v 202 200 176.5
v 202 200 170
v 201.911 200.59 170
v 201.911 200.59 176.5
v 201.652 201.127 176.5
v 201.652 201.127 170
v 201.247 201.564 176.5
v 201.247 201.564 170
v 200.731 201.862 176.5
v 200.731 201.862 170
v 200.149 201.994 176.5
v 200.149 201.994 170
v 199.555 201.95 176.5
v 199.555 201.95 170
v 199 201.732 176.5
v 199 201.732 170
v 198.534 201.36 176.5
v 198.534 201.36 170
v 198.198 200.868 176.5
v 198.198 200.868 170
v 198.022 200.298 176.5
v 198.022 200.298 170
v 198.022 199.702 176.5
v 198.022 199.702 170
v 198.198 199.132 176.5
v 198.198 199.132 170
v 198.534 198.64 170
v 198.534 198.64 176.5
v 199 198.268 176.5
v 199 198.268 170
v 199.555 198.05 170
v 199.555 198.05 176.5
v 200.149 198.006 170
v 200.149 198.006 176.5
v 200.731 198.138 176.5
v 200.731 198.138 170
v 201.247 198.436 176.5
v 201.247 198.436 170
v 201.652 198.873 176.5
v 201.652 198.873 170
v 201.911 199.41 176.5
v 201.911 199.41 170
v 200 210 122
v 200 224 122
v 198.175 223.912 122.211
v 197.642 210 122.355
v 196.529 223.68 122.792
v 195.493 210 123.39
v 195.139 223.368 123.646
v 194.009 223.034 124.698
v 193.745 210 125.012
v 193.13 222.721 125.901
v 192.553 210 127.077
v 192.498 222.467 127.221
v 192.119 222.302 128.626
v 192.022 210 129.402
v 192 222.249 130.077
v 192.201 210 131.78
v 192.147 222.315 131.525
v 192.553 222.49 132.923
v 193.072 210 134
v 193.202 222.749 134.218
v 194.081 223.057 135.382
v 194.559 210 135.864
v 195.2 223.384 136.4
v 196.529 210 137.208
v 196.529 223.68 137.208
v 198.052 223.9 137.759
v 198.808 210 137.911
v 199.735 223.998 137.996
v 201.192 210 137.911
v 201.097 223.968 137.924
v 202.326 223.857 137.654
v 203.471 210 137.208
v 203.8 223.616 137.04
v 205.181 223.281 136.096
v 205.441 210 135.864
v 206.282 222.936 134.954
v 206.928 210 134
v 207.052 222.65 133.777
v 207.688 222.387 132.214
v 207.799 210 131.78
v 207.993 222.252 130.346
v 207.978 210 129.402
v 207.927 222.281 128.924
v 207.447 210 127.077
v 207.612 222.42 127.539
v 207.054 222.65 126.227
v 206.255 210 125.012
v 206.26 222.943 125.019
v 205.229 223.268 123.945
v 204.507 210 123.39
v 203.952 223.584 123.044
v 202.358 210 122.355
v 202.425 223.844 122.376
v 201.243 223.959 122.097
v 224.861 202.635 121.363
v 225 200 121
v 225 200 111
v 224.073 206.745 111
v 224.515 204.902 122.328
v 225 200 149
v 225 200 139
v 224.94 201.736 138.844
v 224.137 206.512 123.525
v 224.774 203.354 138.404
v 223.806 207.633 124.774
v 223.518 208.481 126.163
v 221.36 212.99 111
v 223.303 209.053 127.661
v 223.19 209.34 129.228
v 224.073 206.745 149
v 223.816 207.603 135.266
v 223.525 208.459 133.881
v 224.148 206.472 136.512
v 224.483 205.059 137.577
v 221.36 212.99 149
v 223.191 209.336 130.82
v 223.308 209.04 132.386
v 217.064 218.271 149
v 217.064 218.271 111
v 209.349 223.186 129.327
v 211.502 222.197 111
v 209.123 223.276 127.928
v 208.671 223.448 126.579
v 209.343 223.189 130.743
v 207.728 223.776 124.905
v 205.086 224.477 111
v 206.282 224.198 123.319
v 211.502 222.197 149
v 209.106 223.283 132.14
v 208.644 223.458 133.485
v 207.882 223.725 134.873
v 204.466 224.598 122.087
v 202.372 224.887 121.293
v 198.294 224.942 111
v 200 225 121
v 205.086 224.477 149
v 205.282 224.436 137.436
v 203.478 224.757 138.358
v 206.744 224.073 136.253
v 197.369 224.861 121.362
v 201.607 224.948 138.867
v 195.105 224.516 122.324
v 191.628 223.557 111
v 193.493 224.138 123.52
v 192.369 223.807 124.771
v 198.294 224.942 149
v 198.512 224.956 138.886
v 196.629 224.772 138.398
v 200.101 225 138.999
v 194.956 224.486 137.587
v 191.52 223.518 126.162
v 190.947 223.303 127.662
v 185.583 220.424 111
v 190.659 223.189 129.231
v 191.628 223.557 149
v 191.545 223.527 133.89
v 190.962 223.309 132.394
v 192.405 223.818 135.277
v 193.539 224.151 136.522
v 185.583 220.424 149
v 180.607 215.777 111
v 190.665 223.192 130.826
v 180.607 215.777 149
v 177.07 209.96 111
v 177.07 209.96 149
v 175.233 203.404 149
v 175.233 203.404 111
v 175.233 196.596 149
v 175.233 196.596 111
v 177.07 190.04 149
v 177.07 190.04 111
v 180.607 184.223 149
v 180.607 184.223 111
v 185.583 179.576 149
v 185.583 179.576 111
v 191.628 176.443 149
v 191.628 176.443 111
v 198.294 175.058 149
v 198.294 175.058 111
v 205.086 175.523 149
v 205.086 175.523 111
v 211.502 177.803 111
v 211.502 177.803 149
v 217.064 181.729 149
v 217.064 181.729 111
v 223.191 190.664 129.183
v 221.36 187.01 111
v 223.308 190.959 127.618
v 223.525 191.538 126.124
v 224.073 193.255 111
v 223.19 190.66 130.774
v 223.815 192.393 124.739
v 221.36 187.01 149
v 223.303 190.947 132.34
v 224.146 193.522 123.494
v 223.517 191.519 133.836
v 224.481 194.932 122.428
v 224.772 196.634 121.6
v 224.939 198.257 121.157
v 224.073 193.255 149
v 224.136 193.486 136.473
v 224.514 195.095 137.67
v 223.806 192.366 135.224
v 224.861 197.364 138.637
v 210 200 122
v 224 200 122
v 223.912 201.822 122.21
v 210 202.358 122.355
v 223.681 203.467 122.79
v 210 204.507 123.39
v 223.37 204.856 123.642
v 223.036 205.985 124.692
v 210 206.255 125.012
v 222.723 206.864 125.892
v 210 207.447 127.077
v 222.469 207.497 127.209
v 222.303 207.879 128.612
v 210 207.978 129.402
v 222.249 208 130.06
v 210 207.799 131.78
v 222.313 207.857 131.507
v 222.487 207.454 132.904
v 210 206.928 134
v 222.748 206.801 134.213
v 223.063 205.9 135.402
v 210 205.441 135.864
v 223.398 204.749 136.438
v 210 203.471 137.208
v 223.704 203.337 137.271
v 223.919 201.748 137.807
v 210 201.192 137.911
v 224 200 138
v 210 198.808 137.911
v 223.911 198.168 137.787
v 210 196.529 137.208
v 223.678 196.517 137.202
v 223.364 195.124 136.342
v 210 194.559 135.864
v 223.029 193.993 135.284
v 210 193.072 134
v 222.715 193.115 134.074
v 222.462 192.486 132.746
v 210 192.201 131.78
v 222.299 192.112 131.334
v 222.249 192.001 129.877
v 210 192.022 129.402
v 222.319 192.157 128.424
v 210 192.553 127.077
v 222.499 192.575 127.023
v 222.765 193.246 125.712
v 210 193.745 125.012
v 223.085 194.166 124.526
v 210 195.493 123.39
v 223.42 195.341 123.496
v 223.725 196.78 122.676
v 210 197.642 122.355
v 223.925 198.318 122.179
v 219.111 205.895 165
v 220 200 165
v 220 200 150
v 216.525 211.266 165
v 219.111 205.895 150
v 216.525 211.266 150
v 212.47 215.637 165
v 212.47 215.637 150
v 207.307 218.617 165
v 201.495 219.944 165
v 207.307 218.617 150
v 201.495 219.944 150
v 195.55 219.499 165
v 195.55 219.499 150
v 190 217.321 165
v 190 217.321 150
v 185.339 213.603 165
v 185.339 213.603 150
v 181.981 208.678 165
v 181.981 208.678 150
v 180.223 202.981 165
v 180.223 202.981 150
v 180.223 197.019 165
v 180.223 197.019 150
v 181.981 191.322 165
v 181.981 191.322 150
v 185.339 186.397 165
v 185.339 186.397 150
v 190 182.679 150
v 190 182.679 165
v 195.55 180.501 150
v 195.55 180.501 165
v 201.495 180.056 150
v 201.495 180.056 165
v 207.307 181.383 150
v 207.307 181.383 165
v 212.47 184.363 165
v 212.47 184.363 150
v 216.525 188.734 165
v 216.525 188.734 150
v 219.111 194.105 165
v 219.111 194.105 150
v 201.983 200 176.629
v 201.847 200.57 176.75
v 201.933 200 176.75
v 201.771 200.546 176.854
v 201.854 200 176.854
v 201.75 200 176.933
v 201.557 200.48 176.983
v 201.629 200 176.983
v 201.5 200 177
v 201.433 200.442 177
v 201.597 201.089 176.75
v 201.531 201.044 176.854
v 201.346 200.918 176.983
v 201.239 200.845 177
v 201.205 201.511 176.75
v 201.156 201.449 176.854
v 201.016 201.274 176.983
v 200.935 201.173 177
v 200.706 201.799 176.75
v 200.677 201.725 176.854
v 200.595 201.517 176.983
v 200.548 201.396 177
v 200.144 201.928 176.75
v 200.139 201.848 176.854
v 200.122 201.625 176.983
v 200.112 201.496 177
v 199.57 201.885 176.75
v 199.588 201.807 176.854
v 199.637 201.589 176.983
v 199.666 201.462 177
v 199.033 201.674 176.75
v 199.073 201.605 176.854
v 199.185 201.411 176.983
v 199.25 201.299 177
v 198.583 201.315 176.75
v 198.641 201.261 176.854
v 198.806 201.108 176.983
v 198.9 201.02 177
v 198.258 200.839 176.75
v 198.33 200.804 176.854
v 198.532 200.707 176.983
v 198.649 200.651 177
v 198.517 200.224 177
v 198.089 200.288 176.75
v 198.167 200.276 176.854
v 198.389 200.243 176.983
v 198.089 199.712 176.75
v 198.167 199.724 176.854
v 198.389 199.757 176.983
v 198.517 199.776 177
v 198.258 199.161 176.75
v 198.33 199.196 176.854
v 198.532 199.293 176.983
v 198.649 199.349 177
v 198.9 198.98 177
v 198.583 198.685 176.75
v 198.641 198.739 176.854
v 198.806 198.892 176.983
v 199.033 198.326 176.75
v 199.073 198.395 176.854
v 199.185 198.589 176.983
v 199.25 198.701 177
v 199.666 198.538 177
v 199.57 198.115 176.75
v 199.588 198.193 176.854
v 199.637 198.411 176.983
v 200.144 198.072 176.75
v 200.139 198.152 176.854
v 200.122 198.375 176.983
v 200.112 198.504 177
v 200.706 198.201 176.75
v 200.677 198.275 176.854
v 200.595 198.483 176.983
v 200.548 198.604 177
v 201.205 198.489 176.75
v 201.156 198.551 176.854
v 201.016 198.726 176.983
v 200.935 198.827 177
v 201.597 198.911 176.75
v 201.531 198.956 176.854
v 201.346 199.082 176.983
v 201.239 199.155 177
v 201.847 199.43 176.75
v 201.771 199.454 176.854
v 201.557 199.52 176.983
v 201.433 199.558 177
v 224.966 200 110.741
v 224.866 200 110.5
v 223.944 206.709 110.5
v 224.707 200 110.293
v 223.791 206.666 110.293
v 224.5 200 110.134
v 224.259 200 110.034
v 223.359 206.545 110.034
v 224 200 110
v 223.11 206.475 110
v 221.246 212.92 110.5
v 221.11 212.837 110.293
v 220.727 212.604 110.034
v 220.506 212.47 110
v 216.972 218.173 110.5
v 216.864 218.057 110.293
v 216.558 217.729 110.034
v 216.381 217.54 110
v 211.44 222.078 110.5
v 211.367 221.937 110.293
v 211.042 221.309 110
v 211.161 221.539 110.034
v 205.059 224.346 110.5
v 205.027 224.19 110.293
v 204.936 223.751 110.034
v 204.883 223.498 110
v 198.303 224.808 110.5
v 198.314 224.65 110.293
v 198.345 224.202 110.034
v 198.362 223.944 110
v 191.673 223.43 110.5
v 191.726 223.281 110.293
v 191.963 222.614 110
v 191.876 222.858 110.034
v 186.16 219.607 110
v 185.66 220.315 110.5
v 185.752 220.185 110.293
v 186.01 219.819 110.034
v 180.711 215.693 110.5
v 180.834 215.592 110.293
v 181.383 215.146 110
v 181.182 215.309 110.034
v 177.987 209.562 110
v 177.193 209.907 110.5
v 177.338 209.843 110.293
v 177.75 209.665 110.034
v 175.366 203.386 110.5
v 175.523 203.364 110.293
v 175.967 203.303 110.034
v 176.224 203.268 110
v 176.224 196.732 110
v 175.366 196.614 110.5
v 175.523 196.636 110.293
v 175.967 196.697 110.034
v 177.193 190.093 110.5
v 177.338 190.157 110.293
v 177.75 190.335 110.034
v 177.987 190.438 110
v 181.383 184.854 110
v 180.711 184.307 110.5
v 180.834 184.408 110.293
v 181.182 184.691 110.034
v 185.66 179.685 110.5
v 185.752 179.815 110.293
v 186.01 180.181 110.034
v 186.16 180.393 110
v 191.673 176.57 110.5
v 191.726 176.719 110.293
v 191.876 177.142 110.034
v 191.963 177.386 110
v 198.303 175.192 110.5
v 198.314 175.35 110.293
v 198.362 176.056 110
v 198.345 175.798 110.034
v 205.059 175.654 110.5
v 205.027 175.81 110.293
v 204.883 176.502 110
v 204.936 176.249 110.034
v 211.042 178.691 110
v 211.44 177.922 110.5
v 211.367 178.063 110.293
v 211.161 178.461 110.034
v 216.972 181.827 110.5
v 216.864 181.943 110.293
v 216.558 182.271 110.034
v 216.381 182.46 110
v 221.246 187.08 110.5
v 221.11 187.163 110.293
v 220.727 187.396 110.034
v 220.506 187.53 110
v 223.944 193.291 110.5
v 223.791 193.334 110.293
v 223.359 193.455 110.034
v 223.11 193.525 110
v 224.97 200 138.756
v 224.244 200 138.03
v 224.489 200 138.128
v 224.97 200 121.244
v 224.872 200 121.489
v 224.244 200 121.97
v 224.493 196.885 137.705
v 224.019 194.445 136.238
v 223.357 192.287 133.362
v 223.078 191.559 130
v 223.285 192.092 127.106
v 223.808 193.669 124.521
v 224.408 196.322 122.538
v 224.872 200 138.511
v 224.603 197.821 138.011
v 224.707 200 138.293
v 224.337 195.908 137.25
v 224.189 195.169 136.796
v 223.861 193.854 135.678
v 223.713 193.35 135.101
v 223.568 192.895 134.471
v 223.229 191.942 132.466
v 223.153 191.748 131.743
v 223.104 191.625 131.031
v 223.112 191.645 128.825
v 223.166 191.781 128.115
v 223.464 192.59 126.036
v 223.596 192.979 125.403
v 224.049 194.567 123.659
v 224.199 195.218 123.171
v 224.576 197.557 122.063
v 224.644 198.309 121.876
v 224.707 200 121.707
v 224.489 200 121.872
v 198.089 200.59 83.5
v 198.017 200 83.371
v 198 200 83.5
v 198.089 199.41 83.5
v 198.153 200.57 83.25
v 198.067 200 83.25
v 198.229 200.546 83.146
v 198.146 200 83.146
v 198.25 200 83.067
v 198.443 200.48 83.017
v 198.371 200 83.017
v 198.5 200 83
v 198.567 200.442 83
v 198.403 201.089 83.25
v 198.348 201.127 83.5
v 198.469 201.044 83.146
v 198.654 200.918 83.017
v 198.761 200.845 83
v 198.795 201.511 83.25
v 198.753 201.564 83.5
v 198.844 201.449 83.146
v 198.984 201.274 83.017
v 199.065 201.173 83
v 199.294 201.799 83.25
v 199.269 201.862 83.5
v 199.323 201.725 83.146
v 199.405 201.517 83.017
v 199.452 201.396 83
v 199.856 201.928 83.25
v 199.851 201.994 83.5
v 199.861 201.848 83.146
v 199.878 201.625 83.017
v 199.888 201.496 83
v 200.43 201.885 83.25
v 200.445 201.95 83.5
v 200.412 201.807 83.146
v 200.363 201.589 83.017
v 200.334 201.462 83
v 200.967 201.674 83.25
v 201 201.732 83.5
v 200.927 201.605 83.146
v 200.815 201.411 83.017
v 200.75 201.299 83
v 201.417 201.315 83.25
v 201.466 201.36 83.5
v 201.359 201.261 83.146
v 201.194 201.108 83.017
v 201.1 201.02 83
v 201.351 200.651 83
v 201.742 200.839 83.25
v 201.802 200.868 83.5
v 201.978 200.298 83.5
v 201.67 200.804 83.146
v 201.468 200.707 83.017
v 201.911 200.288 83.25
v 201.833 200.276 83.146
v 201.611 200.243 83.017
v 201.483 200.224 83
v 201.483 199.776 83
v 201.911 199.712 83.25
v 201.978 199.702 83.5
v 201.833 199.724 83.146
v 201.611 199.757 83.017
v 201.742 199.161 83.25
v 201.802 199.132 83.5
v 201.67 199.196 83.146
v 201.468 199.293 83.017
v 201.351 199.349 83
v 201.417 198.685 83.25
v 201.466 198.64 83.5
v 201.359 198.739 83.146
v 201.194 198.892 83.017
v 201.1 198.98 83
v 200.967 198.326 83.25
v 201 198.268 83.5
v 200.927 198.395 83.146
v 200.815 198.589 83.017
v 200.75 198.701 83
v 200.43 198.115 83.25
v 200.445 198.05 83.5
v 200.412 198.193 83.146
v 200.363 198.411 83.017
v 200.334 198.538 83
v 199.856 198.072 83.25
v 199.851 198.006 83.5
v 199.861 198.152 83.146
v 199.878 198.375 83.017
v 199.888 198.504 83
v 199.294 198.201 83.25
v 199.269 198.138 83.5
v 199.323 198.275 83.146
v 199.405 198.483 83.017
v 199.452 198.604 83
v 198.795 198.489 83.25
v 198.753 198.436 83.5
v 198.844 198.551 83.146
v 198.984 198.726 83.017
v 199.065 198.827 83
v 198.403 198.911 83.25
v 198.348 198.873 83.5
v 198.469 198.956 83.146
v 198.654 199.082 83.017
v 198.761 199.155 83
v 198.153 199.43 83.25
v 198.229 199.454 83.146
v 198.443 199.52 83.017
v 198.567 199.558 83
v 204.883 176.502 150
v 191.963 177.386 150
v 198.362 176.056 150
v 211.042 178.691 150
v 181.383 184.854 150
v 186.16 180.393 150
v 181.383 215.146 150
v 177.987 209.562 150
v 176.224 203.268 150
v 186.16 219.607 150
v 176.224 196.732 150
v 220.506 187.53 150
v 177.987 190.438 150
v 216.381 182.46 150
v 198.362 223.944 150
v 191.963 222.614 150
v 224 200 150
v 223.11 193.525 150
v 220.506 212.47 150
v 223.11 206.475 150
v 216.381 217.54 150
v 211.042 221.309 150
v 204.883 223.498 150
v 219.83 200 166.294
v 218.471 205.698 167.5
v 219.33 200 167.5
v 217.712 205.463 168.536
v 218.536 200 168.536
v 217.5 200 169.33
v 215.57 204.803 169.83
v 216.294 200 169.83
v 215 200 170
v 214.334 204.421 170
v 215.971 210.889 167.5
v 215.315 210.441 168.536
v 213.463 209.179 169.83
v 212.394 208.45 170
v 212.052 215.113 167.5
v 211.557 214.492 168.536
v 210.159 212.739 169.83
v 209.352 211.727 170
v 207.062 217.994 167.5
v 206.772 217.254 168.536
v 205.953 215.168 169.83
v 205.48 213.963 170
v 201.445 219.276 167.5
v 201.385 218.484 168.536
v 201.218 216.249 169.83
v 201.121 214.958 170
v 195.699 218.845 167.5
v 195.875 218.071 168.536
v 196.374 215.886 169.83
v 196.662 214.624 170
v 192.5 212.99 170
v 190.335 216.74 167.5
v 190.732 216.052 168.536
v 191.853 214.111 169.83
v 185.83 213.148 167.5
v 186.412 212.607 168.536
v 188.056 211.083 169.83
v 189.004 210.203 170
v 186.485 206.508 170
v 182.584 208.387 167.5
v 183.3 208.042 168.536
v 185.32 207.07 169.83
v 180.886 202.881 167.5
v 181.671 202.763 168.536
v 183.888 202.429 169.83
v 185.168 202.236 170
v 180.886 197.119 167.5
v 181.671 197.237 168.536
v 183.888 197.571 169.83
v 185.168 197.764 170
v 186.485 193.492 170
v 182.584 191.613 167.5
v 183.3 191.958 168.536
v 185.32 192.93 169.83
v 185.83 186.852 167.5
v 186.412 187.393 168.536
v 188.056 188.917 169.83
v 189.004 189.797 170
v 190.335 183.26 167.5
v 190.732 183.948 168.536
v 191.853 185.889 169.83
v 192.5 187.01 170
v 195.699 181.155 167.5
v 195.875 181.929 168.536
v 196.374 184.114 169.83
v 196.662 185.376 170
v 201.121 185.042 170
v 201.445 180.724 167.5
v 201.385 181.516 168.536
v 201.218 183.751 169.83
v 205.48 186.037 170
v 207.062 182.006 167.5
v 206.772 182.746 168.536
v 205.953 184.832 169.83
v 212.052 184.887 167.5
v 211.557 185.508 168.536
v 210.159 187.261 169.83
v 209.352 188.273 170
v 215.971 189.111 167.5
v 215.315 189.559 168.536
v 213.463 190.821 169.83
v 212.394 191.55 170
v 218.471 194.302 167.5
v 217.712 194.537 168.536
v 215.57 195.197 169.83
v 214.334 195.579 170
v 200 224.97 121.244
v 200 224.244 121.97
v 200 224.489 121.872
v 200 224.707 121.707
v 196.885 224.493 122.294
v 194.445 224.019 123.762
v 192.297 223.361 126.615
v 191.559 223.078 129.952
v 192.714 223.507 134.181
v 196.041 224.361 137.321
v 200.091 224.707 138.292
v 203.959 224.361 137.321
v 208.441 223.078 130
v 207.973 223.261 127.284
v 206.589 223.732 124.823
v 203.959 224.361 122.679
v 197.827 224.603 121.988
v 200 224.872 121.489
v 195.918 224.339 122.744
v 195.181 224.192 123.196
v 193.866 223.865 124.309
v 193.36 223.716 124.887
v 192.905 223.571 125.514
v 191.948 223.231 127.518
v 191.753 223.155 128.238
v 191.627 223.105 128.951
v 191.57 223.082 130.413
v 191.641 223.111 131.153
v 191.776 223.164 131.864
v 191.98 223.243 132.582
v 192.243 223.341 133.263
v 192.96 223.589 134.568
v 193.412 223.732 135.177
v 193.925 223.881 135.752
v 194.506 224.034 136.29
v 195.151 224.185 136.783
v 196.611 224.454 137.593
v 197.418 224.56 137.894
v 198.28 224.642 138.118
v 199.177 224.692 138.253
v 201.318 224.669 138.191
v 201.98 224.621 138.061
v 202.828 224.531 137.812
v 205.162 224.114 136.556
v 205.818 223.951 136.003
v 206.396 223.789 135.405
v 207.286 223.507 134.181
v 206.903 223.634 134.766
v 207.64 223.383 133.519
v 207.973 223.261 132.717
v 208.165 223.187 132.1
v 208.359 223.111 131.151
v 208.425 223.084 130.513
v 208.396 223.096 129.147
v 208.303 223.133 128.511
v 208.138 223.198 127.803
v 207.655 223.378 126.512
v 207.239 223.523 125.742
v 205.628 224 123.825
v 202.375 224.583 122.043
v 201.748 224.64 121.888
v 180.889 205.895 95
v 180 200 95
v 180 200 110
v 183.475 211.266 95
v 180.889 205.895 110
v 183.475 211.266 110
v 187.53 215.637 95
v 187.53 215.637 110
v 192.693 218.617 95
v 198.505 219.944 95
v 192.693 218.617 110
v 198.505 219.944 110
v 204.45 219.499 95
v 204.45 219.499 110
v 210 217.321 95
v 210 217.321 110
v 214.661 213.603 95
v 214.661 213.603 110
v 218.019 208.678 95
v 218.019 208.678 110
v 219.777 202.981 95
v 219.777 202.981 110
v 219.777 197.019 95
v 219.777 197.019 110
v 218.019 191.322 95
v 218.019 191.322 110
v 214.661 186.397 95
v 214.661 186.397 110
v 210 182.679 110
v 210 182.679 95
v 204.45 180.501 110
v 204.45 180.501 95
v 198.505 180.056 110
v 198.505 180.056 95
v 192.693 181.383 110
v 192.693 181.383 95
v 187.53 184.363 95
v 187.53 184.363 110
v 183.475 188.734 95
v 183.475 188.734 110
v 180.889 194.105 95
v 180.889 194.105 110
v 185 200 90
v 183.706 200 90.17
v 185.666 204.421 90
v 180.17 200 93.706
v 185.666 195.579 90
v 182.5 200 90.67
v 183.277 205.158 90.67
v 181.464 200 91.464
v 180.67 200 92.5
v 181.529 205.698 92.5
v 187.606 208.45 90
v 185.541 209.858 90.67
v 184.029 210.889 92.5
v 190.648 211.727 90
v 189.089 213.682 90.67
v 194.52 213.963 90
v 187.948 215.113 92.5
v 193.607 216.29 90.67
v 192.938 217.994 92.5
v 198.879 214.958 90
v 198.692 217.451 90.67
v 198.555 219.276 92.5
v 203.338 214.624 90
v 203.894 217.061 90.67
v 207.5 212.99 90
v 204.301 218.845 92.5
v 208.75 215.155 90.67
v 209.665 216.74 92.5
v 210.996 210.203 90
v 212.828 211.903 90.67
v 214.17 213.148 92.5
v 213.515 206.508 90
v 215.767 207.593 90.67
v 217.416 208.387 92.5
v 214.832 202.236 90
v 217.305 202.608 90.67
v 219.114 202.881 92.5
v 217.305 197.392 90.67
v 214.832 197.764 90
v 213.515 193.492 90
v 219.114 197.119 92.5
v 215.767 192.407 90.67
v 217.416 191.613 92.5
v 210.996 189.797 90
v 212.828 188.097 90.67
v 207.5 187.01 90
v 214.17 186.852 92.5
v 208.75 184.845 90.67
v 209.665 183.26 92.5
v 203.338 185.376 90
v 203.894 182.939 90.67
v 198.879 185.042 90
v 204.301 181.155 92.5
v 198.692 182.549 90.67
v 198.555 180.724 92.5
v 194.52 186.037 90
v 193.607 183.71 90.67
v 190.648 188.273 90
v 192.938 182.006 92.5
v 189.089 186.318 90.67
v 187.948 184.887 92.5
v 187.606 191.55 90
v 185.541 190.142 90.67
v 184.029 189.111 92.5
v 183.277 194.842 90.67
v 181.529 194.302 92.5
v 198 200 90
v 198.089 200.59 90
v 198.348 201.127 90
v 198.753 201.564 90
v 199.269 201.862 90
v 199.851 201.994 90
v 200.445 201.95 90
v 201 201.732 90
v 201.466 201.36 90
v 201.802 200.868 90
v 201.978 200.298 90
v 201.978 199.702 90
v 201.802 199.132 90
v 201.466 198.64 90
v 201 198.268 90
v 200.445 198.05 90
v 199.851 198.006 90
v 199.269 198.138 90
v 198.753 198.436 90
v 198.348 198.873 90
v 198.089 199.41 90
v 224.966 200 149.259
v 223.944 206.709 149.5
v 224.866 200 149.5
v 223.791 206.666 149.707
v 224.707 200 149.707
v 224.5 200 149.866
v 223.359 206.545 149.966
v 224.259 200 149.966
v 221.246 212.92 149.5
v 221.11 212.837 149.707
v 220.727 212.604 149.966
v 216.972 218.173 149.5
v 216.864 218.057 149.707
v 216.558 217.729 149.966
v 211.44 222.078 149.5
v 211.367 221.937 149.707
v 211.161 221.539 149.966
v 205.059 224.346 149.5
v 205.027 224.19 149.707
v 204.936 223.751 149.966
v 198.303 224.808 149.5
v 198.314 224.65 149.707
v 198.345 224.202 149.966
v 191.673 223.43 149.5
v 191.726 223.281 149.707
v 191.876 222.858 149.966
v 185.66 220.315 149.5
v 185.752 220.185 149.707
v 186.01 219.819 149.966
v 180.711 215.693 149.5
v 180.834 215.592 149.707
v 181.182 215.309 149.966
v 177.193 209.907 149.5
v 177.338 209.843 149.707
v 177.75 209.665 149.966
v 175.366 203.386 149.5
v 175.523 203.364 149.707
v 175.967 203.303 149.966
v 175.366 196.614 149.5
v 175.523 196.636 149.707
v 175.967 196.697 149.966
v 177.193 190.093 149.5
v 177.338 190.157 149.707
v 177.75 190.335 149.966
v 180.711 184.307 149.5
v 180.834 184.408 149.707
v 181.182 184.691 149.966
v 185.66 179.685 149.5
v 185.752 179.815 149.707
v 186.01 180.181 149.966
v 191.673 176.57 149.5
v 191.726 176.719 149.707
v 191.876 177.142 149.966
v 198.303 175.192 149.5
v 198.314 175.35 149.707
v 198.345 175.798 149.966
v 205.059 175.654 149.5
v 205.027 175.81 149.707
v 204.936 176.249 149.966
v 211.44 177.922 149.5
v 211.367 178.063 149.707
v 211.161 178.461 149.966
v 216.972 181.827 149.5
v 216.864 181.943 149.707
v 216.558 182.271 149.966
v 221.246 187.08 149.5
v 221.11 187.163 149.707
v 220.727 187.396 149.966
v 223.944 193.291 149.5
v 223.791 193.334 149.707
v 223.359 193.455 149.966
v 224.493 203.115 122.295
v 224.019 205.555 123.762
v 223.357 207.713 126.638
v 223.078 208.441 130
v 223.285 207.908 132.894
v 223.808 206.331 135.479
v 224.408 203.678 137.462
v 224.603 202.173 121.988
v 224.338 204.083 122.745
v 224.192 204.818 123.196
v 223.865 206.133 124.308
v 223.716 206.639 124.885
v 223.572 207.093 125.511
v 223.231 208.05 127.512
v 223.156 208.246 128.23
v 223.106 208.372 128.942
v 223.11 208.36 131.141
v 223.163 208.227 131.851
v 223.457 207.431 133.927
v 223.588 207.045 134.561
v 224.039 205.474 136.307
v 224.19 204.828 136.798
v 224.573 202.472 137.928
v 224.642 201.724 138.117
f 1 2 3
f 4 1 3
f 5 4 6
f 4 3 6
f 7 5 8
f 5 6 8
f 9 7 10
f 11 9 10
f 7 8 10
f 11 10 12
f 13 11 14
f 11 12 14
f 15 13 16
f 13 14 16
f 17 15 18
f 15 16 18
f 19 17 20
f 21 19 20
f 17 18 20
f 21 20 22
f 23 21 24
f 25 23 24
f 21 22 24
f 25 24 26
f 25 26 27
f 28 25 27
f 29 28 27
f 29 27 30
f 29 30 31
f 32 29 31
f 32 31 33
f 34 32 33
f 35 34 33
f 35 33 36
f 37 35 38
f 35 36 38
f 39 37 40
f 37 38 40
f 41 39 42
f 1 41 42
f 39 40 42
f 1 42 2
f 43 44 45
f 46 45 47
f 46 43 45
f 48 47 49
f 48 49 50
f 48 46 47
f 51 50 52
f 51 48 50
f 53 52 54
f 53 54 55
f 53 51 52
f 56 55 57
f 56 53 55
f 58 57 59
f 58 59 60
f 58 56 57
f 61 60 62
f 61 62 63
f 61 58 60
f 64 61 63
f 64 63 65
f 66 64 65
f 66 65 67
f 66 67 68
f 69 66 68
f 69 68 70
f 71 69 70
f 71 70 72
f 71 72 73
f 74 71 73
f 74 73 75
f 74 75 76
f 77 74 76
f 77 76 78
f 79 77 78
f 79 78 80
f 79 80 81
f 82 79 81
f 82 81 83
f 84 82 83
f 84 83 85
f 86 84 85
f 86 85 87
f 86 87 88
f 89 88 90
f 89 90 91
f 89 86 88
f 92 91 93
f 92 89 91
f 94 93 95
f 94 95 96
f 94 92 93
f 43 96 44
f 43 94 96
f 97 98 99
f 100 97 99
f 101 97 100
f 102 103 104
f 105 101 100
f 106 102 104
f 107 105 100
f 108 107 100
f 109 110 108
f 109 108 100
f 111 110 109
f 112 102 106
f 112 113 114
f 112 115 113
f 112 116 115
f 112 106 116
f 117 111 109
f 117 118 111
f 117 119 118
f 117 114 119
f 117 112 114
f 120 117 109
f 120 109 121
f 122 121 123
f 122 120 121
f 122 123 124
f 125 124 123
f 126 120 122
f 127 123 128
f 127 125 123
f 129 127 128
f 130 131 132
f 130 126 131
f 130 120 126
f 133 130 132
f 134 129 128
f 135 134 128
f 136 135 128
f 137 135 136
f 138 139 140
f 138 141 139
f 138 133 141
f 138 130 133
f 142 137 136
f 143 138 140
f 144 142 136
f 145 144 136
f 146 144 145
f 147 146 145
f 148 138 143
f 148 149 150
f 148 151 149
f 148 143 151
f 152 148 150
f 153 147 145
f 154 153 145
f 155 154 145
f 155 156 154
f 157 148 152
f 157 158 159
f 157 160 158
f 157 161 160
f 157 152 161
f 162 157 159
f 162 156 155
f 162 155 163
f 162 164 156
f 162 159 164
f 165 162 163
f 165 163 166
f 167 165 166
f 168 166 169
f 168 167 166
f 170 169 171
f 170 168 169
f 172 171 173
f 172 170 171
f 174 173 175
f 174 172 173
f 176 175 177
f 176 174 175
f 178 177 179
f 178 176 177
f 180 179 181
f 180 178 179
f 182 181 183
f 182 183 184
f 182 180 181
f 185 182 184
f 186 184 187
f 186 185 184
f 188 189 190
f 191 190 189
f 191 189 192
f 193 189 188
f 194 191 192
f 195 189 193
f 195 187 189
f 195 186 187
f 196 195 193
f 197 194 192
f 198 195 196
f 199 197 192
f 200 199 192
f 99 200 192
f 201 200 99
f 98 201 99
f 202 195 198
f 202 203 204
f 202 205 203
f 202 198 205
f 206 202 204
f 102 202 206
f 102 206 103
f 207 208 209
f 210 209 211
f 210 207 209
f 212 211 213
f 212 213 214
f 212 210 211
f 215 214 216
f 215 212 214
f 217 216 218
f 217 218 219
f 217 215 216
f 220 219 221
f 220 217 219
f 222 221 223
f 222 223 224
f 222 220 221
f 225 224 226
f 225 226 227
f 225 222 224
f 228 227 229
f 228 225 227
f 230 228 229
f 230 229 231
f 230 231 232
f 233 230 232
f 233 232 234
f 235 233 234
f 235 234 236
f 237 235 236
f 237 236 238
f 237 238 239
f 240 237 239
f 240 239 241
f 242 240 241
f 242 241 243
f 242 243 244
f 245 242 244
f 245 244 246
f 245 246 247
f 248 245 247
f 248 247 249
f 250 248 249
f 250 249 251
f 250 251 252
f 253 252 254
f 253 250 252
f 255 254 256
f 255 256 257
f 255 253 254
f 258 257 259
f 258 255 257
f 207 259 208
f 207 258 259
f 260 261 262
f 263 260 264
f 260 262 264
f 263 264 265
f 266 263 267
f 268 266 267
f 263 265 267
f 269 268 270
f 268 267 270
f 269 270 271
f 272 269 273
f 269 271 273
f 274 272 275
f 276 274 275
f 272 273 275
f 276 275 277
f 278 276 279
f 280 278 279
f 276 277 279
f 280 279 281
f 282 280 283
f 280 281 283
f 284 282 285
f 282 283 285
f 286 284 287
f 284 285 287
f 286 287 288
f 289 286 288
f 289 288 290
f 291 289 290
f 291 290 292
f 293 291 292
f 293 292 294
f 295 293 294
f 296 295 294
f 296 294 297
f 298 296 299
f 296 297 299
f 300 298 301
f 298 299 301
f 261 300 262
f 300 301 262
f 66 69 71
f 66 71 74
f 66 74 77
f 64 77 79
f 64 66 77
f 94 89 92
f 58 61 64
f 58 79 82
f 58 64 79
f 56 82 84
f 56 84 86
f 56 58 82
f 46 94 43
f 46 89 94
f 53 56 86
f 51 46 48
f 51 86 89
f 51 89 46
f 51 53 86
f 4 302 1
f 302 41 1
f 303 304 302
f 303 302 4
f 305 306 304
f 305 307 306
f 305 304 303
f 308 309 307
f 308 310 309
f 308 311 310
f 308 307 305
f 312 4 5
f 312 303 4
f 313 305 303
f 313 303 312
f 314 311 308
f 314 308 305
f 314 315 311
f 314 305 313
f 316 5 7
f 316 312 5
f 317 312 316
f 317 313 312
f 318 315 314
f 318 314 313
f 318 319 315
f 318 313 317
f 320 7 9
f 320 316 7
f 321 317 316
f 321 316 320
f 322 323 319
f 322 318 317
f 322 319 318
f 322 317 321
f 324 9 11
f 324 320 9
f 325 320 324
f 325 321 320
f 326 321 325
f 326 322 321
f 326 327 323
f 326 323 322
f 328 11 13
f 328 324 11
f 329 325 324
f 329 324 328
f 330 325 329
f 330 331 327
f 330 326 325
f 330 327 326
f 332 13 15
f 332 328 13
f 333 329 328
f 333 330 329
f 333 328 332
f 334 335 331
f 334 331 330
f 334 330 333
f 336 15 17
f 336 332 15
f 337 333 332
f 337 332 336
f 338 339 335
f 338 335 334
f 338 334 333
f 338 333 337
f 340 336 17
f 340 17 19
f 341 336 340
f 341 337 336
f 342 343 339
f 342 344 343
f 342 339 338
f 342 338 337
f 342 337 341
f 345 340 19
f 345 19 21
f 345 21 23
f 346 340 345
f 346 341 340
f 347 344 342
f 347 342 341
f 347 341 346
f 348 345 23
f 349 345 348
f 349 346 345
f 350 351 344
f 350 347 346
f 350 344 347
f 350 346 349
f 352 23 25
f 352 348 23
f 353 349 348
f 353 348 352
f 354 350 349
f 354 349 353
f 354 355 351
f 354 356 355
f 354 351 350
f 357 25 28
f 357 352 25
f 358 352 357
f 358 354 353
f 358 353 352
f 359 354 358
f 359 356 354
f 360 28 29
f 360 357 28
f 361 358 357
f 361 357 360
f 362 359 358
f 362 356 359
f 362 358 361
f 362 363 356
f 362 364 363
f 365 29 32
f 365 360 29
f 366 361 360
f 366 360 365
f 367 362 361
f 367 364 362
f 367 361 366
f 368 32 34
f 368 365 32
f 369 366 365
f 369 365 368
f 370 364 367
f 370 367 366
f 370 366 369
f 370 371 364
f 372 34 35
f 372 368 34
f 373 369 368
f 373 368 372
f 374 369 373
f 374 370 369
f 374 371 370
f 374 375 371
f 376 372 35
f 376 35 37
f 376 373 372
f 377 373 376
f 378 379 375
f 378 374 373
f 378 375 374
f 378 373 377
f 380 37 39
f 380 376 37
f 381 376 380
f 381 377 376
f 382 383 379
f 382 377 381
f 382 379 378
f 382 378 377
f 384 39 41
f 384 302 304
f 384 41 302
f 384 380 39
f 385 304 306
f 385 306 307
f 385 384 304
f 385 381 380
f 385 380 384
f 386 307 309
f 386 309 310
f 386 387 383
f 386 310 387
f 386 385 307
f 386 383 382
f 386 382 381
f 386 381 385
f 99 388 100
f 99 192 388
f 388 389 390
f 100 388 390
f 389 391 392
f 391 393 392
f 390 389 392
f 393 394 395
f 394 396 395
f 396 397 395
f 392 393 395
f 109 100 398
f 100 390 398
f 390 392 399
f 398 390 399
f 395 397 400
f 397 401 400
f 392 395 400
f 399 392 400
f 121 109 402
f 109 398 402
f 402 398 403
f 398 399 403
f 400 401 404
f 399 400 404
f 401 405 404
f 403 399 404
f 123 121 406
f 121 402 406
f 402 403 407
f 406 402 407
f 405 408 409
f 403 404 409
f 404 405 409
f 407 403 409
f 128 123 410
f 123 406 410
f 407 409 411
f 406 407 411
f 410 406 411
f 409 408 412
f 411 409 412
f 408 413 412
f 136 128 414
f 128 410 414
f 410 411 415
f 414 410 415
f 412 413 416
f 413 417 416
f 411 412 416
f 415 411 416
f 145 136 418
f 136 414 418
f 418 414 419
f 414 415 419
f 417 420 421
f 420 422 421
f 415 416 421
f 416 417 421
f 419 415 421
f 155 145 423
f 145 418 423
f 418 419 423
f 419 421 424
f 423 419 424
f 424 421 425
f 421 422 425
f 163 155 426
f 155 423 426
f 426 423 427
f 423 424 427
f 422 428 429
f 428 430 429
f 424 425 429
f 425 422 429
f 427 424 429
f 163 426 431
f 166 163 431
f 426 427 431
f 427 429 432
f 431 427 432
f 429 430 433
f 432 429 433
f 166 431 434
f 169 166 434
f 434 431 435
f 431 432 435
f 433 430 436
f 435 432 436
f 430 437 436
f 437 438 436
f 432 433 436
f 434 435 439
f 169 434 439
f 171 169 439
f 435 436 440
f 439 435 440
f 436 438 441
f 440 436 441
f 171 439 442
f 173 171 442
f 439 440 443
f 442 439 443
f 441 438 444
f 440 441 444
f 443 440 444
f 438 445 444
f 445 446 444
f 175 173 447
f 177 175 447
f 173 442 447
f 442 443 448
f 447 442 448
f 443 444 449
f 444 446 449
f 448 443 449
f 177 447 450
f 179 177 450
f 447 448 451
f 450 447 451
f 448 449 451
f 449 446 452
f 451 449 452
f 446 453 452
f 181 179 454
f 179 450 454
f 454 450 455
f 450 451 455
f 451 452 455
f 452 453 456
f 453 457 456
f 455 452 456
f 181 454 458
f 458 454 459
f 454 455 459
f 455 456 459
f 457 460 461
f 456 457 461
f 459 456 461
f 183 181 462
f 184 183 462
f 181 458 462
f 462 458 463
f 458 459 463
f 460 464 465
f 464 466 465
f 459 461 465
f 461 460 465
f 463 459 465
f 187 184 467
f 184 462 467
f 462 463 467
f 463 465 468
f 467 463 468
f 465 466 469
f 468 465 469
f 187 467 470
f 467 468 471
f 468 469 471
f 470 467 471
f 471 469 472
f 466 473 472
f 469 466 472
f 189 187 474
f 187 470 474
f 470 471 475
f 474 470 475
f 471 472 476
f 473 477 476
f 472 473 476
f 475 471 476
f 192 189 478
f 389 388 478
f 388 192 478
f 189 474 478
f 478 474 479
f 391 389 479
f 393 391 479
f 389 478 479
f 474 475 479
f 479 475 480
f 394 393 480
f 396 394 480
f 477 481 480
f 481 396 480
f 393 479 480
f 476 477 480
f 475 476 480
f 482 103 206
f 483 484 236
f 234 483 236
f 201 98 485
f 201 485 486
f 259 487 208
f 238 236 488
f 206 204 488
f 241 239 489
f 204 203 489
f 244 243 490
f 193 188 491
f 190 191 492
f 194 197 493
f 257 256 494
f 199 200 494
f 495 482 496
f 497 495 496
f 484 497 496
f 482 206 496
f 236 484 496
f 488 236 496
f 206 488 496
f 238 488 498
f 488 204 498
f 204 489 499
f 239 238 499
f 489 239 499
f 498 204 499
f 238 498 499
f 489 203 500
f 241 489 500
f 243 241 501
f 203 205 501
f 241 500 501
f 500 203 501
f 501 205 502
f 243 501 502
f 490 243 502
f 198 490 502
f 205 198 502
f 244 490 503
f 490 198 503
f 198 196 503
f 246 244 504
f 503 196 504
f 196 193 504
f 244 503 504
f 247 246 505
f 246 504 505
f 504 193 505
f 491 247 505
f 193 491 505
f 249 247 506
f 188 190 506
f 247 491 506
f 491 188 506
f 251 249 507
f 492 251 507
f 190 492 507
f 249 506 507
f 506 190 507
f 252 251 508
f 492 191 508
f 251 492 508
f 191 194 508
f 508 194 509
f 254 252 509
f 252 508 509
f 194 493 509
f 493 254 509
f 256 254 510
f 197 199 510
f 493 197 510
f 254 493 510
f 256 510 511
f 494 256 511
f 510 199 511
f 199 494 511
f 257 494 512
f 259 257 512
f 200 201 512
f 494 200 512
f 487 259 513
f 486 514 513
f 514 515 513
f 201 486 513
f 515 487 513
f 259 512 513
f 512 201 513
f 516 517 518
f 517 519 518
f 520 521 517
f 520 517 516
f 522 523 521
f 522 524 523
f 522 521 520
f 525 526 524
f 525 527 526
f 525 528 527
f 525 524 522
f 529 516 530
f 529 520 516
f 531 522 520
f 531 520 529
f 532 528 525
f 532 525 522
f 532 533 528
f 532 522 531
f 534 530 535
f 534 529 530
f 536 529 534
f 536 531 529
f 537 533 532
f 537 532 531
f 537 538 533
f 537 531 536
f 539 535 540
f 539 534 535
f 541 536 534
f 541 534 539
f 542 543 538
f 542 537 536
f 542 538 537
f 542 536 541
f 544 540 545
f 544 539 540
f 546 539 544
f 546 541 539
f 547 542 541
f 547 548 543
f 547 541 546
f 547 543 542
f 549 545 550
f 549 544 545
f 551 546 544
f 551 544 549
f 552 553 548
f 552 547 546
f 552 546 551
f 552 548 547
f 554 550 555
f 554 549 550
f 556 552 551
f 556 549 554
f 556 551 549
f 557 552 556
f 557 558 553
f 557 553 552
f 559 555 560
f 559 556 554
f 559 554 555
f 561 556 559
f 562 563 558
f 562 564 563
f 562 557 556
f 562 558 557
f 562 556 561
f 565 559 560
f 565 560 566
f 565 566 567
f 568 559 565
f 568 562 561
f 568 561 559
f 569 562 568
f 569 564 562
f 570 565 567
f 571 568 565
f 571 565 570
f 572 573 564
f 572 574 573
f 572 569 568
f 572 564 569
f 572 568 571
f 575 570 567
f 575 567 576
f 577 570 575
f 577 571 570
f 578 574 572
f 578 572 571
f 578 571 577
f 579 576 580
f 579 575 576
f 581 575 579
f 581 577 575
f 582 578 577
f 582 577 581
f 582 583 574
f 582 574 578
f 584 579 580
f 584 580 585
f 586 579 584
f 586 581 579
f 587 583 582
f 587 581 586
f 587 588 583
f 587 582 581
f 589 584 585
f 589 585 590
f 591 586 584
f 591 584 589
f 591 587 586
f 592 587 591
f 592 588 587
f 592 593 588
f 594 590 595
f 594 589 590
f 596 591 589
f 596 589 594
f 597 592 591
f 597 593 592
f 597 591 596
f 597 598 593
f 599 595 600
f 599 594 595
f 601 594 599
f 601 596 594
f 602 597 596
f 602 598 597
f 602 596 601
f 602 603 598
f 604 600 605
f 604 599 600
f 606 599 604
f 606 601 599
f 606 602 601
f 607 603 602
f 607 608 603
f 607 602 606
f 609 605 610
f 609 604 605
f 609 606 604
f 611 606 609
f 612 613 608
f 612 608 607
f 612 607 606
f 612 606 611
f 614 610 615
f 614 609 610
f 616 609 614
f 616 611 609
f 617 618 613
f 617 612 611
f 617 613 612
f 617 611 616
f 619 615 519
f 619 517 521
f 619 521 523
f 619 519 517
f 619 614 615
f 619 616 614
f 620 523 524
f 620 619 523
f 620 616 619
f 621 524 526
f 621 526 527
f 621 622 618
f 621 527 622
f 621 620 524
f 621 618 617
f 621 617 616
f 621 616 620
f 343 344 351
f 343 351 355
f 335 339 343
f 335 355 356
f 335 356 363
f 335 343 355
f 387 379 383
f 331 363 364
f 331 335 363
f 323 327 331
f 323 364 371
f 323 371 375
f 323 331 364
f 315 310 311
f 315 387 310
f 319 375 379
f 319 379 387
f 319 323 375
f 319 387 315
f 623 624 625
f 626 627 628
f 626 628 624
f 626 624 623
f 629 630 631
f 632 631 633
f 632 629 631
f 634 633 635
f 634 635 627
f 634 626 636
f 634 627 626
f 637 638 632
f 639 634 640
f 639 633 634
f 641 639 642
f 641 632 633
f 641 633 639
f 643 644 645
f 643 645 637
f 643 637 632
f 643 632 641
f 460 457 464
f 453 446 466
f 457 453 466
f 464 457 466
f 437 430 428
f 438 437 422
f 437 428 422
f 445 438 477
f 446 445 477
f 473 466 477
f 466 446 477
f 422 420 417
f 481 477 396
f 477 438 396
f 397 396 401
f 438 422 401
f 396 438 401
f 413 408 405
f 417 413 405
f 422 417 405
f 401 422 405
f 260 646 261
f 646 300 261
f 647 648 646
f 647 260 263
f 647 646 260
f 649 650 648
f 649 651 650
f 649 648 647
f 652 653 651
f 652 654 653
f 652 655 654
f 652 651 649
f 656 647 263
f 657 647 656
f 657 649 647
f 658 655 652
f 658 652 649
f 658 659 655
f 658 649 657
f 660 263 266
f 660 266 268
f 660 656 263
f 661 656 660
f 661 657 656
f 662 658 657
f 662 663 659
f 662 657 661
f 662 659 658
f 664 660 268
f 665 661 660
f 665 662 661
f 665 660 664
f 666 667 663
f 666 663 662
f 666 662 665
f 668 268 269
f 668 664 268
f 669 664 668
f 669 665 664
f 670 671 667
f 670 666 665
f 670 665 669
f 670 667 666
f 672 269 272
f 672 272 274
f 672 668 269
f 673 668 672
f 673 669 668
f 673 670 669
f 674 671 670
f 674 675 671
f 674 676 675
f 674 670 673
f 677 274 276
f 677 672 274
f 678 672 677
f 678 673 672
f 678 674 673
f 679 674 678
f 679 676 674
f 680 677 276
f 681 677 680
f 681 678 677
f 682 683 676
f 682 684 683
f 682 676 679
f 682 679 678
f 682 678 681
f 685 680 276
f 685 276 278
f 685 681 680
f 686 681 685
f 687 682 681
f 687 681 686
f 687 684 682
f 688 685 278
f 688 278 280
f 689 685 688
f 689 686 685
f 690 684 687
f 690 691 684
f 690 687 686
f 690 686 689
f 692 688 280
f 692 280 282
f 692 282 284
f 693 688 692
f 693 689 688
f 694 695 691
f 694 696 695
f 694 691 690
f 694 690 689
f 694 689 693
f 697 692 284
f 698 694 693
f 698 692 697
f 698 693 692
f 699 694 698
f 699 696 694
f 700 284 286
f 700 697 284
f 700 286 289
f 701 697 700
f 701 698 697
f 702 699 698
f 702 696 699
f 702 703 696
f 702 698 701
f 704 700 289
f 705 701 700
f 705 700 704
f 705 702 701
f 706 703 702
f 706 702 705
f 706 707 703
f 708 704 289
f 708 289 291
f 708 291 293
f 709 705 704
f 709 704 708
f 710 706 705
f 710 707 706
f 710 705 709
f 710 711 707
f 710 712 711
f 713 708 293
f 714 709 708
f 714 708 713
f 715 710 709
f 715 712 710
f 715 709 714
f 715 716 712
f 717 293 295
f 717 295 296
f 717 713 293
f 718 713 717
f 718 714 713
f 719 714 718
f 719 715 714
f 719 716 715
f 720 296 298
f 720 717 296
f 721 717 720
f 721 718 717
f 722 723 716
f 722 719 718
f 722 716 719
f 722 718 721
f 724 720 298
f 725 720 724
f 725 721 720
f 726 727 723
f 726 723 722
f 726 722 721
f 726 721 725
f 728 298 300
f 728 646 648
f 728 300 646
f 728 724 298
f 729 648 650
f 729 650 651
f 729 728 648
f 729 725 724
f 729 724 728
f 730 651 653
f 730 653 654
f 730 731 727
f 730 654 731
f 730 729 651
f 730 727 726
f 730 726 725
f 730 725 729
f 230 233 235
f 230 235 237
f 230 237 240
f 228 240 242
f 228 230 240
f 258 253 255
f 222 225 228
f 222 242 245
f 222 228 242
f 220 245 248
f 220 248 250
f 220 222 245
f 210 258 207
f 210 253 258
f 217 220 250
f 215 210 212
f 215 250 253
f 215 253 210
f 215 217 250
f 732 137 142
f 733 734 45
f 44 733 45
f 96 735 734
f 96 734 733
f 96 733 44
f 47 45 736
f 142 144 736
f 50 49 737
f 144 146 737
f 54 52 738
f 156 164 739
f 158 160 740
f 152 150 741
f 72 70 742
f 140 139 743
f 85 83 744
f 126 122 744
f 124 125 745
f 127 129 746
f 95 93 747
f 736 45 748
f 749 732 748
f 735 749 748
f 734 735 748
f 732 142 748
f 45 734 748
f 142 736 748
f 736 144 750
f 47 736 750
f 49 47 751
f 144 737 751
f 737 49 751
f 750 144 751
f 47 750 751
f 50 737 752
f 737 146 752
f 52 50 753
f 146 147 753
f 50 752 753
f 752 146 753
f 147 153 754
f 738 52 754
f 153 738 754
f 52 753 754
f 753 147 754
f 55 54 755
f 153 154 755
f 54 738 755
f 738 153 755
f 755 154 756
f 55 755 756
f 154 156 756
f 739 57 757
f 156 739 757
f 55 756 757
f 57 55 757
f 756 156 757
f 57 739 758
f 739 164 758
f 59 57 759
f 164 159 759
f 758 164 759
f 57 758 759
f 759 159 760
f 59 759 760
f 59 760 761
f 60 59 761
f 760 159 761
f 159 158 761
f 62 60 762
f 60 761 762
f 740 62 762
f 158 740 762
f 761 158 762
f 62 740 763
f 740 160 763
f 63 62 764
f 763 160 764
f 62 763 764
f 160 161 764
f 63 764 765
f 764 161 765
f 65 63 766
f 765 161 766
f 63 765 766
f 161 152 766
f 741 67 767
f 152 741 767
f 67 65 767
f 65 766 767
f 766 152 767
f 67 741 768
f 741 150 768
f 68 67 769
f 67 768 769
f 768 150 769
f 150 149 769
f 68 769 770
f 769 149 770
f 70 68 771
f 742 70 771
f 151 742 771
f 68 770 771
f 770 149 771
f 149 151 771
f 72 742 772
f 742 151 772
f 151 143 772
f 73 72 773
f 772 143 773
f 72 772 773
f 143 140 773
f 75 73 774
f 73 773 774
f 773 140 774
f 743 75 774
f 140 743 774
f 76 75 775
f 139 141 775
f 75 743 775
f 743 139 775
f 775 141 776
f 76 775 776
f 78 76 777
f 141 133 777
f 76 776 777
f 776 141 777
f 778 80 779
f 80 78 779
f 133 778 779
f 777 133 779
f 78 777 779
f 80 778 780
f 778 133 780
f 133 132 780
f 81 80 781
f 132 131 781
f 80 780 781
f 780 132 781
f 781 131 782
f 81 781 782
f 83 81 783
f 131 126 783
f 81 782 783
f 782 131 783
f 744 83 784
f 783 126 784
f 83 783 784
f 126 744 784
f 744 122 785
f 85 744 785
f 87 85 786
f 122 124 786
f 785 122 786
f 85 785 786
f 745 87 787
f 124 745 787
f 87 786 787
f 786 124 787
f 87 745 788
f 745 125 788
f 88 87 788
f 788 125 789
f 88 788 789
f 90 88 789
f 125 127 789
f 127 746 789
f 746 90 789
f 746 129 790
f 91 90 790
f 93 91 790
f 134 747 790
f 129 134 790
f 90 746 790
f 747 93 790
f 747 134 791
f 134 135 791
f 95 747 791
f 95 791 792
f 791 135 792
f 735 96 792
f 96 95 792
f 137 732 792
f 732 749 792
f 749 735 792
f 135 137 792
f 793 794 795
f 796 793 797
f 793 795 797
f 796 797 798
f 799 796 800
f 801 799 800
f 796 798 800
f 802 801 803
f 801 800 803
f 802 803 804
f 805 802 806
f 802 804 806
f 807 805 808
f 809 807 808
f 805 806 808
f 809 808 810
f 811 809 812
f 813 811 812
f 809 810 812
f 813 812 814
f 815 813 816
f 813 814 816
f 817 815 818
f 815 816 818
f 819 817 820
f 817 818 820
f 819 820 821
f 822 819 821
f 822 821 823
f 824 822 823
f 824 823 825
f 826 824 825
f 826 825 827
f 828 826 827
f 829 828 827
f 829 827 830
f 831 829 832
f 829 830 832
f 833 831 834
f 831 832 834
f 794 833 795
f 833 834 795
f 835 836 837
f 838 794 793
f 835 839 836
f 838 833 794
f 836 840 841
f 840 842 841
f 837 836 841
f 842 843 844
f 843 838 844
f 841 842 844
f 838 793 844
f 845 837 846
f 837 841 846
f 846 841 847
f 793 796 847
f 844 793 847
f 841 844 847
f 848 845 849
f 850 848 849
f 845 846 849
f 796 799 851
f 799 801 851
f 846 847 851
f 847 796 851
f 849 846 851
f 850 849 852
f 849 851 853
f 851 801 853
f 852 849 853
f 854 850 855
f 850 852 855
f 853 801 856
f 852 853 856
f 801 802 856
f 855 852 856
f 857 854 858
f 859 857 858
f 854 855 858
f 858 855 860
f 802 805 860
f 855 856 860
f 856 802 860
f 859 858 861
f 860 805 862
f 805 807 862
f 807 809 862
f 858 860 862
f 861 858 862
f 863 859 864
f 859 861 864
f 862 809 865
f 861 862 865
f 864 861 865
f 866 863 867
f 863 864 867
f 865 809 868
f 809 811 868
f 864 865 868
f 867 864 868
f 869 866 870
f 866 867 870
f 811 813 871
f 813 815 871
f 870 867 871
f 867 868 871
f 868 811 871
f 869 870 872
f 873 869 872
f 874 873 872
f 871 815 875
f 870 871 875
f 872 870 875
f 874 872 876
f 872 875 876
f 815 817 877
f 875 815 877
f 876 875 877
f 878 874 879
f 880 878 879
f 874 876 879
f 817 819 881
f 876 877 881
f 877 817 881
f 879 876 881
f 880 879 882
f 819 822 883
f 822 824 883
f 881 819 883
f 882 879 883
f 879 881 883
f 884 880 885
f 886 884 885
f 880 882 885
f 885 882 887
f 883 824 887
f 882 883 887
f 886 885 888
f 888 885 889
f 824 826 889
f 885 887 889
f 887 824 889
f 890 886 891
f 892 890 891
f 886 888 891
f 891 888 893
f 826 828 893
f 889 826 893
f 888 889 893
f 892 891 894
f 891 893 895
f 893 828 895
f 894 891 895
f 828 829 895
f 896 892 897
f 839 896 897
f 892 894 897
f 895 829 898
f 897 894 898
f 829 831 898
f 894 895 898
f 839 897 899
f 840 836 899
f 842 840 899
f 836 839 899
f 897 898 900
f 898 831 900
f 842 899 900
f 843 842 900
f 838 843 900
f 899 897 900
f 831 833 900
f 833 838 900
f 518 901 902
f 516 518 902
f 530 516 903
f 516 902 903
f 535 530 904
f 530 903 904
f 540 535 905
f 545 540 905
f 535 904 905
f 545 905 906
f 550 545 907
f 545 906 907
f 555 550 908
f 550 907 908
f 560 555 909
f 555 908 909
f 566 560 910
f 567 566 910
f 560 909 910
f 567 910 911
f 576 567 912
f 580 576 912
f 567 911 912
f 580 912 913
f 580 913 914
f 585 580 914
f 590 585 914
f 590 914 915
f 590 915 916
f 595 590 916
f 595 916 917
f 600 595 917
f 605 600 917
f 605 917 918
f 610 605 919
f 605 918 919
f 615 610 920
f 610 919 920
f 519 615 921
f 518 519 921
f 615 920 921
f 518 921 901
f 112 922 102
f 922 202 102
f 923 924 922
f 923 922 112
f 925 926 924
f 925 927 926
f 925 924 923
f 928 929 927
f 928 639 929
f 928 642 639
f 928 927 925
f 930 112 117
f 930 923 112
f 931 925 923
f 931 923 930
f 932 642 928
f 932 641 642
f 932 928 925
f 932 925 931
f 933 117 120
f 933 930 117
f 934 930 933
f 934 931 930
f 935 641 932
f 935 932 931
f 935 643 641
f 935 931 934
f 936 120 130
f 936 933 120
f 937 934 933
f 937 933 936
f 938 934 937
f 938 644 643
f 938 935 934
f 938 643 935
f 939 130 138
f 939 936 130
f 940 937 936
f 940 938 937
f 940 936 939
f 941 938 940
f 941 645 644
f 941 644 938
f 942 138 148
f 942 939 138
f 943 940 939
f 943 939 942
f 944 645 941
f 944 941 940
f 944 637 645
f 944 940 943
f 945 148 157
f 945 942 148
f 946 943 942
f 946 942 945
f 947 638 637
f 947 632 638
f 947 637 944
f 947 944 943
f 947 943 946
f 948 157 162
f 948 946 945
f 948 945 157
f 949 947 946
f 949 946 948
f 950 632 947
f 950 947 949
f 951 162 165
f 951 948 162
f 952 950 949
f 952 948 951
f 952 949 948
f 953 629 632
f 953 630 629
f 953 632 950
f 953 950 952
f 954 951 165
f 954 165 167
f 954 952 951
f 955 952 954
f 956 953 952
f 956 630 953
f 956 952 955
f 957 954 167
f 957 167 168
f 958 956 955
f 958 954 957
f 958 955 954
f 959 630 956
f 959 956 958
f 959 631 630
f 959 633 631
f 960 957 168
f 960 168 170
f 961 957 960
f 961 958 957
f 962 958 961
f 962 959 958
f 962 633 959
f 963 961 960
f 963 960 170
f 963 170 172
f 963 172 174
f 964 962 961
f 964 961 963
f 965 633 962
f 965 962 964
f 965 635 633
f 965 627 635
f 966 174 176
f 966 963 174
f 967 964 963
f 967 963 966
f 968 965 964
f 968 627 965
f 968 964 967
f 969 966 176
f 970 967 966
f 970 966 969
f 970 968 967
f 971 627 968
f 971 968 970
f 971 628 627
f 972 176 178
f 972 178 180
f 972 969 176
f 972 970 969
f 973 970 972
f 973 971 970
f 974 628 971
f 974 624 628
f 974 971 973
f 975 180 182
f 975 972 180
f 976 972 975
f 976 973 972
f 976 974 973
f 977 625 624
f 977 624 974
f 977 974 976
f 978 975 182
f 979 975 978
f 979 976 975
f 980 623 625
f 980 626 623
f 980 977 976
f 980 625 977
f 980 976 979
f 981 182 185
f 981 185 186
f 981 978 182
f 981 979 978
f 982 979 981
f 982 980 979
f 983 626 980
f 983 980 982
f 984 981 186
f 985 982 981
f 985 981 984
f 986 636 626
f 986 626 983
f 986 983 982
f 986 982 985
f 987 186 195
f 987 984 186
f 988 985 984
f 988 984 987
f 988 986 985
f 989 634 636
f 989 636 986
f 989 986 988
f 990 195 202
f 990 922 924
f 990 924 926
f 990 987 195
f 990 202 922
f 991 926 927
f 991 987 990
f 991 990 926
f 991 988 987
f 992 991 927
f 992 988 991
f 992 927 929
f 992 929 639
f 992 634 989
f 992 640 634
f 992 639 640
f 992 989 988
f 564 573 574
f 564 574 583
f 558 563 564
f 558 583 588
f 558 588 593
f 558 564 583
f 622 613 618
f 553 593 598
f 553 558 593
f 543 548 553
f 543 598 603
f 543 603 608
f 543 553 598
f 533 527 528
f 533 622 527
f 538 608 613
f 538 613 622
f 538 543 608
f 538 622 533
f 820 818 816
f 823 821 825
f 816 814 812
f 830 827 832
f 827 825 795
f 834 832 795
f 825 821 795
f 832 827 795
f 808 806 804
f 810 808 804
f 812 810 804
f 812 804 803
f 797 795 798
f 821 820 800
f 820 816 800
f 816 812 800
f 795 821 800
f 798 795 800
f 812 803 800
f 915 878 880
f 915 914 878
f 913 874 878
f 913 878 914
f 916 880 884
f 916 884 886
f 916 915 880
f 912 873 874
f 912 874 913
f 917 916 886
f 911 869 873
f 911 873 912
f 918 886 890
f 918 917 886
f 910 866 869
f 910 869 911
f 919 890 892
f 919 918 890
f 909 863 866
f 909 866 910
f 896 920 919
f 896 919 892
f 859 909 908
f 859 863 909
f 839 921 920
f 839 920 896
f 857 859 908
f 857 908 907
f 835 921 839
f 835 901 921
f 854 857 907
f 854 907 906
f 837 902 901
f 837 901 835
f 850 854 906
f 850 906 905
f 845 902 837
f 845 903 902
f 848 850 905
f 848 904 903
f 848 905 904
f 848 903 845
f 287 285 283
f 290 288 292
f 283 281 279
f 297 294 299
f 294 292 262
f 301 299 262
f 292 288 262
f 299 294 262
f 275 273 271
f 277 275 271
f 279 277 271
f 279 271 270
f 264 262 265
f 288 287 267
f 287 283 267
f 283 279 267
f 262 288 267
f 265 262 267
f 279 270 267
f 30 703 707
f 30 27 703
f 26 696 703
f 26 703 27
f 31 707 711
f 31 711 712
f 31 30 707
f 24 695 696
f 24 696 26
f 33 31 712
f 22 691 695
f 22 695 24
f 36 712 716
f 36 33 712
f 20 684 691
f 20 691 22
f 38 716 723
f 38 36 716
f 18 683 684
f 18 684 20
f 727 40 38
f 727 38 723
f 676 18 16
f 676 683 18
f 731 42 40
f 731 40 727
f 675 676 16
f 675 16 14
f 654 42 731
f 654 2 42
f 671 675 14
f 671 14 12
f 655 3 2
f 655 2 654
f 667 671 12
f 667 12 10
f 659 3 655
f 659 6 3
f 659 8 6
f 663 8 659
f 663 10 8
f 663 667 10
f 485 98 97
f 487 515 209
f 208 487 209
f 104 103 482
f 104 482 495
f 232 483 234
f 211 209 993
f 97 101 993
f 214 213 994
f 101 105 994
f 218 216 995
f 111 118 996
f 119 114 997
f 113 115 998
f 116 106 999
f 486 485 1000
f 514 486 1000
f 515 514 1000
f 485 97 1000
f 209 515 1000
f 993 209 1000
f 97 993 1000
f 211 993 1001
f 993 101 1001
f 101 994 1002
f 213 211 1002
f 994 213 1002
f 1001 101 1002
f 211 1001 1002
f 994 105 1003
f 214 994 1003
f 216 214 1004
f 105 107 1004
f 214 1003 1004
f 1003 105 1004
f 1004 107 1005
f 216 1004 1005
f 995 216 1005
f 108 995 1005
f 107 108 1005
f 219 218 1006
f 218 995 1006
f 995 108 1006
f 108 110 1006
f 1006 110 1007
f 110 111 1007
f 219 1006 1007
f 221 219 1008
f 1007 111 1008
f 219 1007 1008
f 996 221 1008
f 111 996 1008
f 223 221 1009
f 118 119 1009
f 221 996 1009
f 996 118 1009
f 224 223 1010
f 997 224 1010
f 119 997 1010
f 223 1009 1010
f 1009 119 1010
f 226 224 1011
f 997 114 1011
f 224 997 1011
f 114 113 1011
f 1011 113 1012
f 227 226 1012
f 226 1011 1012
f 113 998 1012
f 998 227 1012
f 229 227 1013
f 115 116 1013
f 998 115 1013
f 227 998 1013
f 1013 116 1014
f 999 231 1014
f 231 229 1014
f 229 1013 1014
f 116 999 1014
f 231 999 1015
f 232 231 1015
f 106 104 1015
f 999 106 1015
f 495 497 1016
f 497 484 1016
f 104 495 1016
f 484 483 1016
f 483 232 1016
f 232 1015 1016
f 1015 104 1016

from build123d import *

# Parameters (mm, degrees)
SKETCH20_R           = 25
BOSS_EXTRUDE6_DEPTH  = 40
SKETCH21_R           = 8
CUT_EXTRUDE2_DEPTH   = 26
CIRPATTERN1_COUNT    = 2
CIRPATTERN1_ANGLE    = 90
SKETCH24_R           = 20
BOSS_EXTRUDE7_DEPTH  = 20
FILLET3_R            = 5
SKETCH25_R           = 2
BOSS_EXTRUDE8_DEPTH  = 7
FILLET4_R            = 0.5
FILLET5_R            = 1
SKETCH26_R           = 20
BOSS_EXTRUDE9_DEPTH  = 20
SKETCH27_R           = 2
BOSS_EXTRUDE10_DEPTH = 7
FILLET6_R            = 0.5
FILLET7_R            = 5


with BuildPart() as part:
    # Sketch20 → Boss-Extrude6 (new body)
    with BuildSketch(Plane.XY.offset(150)):
        with Locations((200, 200)):
            Circle(SKETCH20_R)
    extrude(amount=-BOSS_EXTRUDE6_DEPTH)

    # Sketch21 → Cut-Extrude2 (cut)
    with BuildSketch(Plane(origin=(0, 210, 0), x_dir=(1, 0, 0), z_dir=(0, 1, 0))):
        with Locations((200, -130)):
            Circle(SKETCH21_R)
    cut_extrude2 = extrude(amount=CUT_EXTRUDE2_DEPTH, mode=Mode.SUBTRACT)

    # CirPattern1: Cut-Extrude2 ×2 about axis
    cirpattern1_axis = Axis((200, 200, 110), (0, 0, -1))
    for i in range(1, CIRPATTERN1_COUNT):
        add(cut_extrude2.rotate(cirpattern1_axis, i * CIRPATTERN1_ANGLE / (CIRPATTERN1_COUNT - 1)), mode=Mode.SUBTRACT)

    # Fillet5
    fillet5_edges = [part.edges().sort_by_distance(p)[0] for p in [
        (223.685438565, 208, 130),
        (192, 223.685438565, 130),
        (175, 200, 110),
        (175, 200, 150),
    ]]
    fillet(fillet5_edges, radius=FILLET5_R)


with BuildPart() as body_2:
    # Sketch24 → Boss-Extrude7 (new body)
    with BuildSketch(Plane.XY.offset(150)):
        with Locations((200, 200)):
            Circle(SKETCH24_R)
    extrude(amount=BOSS_EXTRUDE7_DEPTH)

    # Fillet3
    fillet3_edges = [body_2.edges().sort_by_distance(p)[0] for p in [
        (180, 200, 170),
    ]]
    fillet(fillet3_edges, radius=FILLET3_R)

    # Sketch25 → Boss-Extrude8 (add)
    with BuildSketch(Plane.XY.offset(170)):
        with Locations((200, 200)):
            Circle(SKETCH25_R)
    extrude(amount=BOSS_EXTRUDE8_DEPTH)

    # Fillet4
    fillet4_edges = [body_2.edges().sort_by_distance(p)[0] for p in [
        (198, 200, 177),
    ]]
    fillet(fillet4_edges, radius=FILLET4_R)


with BuildPart() as body_3:
    # Sketch26 → Boss-Extrude9 (new body)
    with BuildSketch(Plane(origin=(0, 0, 110), x_dir=(-1, 0, 0), z_dir=(0, 0, -1))):
        with Locations((-200, 200)):
            Circle(SKETCH26_R)
    extrude(amount=BOSS_EXTRUDE9_DEPTH)

    # Sketch27 → Boss-Extrude10 (add)
    with BuildSketch(Plane(origin=(0, 0, 90), x_dir=(1, 0, 0), z_dir=(0, 0, -1))):
        with Locations((200, -200)):
            Circle(SKETCH27_R)
    extrude(amount=BOSS_EXTRUDE10_DEPTH)

    # Fillet6
    fillet6_edges = [body_3.edges().sort_by_distance(p)[0] for p in [
        (198, 200, 83),
    ]]
    fillet(fillet6_edges, radius=FILLET6_R)

    # Fillet7
    fillet7_edges = [body_3.edges().sort_by_distance(p)[0] for p in [
        (220, 200, 90),
    ]]
    fillet(fillet7_edges, radius=FILLET7_R)


solid = Compound([part.part, body_2.part, body_3.part])
